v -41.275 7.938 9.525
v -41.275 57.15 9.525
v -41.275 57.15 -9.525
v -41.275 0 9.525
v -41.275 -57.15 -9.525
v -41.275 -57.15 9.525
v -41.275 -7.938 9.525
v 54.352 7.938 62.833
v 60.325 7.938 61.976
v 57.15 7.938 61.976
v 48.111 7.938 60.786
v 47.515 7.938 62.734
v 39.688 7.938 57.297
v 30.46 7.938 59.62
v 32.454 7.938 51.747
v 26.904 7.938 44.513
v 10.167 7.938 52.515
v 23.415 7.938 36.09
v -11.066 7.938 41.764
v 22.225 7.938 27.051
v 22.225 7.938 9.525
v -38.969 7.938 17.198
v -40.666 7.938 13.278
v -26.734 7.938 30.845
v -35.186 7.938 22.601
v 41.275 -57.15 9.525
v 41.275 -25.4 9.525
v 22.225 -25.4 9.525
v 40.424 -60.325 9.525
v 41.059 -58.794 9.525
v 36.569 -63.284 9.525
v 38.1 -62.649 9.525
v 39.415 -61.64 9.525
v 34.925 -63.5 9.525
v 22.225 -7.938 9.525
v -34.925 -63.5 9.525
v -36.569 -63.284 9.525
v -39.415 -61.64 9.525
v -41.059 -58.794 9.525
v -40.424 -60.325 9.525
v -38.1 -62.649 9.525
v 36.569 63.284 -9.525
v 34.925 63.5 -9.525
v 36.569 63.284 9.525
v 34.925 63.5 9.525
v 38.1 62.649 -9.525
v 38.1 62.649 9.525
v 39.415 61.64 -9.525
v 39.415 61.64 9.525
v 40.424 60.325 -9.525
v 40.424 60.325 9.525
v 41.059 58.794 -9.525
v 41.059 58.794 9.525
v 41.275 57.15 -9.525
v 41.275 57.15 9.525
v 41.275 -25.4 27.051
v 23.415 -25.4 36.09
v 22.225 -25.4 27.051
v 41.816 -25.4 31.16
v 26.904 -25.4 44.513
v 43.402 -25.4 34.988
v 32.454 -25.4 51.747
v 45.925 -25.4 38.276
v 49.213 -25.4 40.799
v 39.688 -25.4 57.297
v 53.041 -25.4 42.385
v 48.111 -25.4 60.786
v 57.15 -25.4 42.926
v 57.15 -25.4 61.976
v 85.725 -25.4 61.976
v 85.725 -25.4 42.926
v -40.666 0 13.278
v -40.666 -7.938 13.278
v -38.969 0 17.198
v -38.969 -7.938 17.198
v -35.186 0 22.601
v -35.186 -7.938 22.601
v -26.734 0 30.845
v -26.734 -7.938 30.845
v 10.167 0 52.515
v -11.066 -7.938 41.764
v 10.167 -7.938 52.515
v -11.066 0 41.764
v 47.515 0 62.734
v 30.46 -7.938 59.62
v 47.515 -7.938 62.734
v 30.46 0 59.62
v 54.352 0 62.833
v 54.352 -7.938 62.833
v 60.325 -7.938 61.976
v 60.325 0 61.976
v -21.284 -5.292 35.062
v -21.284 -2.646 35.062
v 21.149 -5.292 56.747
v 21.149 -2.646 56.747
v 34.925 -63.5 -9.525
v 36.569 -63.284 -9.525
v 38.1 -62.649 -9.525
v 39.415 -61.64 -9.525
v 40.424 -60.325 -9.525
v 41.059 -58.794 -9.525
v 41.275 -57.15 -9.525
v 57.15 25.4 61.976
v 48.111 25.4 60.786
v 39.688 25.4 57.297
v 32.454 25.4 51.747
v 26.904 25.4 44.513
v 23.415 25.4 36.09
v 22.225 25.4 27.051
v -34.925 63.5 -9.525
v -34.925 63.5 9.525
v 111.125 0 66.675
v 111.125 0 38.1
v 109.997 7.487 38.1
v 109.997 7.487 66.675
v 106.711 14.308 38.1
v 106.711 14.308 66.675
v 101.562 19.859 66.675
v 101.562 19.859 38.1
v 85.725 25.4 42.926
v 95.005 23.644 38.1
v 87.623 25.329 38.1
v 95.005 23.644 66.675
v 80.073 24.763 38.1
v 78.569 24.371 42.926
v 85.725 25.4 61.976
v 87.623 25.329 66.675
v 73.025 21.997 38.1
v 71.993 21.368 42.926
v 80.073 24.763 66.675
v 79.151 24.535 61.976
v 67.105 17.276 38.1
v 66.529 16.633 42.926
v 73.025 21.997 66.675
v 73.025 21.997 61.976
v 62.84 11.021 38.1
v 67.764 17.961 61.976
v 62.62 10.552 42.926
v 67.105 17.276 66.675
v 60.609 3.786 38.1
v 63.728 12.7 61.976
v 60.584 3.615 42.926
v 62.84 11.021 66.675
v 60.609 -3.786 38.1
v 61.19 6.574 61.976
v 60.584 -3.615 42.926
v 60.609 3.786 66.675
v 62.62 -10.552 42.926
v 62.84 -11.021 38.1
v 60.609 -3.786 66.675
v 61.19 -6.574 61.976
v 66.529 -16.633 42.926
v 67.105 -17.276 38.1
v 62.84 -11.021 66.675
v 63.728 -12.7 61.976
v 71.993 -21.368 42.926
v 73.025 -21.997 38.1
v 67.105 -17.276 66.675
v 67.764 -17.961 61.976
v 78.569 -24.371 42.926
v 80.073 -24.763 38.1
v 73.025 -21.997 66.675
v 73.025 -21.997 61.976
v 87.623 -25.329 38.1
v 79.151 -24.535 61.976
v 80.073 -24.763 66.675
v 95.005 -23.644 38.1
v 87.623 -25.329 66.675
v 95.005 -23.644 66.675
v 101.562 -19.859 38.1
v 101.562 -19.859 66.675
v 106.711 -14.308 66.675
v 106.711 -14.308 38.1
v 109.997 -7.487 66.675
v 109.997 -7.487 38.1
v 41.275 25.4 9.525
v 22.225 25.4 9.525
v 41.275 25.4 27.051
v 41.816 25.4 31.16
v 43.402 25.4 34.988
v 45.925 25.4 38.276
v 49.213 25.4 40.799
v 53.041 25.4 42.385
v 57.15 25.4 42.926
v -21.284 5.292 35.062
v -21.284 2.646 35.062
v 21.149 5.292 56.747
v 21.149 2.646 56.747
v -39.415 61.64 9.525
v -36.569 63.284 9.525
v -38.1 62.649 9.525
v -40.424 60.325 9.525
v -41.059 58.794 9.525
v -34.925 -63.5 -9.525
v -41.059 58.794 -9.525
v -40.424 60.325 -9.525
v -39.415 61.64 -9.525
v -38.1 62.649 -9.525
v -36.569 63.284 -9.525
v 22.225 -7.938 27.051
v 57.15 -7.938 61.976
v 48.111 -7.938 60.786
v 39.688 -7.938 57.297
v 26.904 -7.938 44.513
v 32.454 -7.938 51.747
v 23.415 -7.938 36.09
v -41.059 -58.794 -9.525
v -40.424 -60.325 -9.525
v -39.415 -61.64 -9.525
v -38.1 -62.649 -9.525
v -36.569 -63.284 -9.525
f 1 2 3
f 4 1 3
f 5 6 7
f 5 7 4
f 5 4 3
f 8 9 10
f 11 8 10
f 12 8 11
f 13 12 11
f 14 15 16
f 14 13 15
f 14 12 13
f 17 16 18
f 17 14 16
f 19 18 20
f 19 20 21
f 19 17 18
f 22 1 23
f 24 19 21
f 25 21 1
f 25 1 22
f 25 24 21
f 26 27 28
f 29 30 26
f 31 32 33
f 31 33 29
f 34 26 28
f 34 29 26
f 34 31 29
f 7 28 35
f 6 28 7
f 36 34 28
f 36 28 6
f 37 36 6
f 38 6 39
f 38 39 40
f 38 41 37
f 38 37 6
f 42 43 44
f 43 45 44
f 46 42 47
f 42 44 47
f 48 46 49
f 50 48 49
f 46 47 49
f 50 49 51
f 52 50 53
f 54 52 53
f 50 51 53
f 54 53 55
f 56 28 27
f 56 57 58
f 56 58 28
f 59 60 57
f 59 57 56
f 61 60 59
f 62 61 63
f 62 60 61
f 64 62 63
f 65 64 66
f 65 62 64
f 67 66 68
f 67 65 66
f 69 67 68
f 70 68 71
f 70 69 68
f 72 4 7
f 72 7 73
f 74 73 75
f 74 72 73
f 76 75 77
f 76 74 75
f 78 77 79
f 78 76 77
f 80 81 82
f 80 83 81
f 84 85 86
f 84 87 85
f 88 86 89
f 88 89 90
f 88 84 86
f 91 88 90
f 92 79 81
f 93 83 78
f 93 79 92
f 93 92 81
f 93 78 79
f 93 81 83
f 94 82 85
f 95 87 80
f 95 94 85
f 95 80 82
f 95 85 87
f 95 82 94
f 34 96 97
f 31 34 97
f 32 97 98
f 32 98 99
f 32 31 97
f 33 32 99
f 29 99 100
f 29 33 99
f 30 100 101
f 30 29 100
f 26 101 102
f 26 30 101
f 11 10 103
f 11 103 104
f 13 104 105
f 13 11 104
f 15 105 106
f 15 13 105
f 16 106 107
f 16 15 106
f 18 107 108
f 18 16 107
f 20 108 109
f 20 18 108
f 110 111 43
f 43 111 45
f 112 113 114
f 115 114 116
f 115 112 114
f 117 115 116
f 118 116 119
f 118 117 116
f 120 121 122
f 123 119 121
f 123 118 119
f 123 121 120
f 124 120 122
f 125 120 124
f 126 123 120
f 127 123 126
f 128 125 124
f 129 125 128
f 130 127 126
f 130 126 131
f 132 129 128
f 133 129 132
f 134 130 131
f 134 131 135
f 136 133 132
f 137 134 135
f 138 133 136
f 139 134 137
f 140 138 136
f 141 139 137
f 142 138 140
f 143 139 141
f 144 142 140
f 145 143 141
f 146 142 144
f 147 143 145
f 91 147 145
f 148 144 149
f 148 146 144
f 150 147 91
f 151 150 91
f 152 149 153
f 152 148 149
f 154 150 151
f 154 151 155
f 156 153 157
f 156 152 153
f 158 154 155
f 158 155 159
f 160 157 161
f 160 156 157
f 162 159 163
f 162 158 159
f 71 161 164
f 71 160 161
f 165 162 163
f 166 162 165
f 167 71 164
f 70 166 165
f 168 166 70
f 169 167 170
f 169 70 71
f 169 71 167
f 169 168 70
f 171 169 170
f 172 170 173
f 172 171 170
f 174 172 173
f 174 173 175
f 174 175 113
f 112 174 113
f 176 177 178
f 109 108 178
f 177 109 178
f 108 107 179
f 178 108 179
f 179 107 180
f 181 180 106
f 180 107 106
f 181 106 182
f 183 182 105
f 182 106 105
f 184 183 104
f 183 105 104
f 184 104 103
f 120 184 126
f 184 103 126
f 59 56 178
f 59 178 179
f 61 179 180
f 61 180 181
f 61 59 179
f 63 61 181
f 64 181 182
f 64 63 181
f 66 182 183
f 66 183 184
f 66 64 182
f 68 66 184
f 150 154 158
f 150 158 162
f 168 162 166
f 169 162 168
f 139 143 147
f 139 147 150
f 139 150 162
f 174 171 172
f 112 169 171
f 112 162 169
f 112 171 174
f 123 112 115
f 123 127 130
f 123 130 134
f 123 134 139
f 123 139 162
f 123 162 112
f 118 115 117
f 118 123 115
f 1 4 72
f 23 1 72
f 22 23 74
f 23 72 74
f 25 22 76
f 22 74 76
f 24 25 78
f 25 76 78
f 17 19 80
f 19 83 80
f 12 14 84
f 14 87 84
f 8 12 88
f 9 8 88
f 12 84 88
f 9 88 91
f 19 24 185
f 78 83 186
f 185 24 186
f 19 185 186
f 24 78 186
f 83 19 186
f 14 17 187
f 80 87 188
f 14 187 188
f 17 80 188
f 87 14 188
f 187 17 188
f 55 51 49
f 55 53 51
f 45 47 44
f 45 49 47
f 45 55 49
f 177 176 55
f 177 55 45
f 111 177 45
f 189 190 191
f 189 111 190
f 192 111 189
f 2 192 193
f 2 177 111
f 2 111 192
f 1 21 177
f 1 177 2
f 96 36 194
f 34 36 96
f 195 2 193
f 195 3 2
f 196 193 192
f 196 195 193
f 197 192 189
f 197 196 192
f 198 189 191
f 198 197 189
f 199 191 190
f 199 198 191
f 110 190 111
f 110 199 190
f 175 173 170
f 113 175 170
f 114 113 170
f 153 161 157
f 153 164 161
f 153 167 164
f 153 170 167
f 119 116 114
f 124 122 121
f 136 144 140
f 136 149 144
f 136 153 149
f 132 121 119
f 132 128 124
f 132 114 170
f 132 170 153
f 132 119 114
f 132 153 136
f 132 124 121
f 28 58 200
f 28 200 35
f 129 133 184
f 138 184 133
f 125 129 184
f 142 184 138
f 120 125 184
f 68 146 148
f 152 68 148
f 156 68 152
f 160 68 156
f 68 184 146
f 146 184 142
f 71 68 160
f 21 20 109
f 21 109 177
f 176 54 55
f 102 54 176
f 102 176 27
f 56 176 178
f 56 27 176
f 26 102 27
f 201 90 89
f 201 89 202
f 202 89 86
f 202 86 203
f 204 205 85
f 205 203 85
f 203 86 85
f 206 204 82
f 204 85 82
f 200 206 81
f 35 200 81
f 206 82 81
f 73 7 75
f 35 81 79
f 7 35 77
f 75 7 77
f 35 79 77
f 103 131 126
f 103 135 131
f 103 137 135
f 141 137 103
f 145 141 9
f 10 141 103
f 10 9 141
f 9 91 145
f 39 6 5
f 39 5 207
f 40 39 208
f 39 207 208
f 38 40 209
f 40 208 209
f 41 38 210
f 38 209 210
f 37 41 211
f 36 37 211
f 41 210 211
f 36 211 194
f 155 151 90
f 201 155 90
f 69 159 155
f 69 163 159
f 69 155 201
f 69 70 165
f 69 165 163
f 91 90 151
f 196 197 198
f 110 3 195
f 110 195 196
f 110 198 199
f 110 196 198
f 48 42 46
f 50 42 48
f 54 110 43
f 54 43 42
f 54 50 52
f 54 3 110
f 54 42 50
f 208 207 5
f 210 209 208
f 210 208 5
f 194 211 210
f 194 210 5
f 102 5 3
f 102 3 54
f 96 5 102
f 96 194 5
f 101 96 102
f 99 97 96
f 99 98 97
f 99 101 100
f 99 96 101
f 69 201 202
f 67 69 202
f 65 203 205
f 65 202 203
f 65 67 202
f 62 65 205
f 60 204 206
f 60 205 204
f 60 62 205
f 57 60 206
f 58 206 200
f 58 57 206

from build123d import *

# Parameters (mm, degrees)
F1_DEPTH = 63.5
F0_W     = 25.4
F0_H     = 19.05
F2_DEPTH = 25.4
F3_DEPTH = 7.9375
F4_R     = 6.35


with BuildPart() as f1:
    # F0 (on Front) → F1 (new body, symmetric)
    with BuildSketch(Plane.XZ):
        Polygon((-41.275, 9.525), (-41.275, -9.525), (41.275, -9.525), (41.275, 9.525), (22.225, 9.525), align=None)
    extrude(amount=F1_DEPTH, both=True)

    # F0 (on Front) → F2 (join, symmetric)
    with BuildSketch(Plane.XZ):
        with BuildLine():
            Line((22.225, 9.525), (41.275, 9.525))
            Line((41.275, 9.525), (41.275, 27.051))
            ThreePointArc((41.275, 27.051), (45.92468, 38.27632), (57.15, 42.926))
            Line((57.15, 42.926), (60.325, 42.926))
            Line((60.325, 42.926), (60.325, 61.976))
            Line((60.325, 61.976), (57.15, 61.976))
            ThreePointArc((57.15, 61.976), (32.454296, 51.746704), (22.225, 27.051))
            Line((22.225, 27.051), (22.225, 9.525))
        make_face()
        with Locations((73.025, 52.451)):
            Rectangle(F0_W, F0_H)
    extrude(amount=F2_DEPTH, both=True)

    # F0 (on Front) → F3 (join, symmetric)
    with BuildSketch(Plane.XZ):
        with BuildLine():
            add(Edge.make_bspline(
                [(-41.275, 9.525), (-41.072655, 32.786246), (31.344924, 69.177315), (60.325, 61.976)],
                knots=[0, 0, 0, 0, 114.340139, 114.340139, 114.340139, 114.340139], degree=3))
            Line((-41.275, 9.525), (22.225, 9.525))
            Line((22.225, 9.525), (22.225, 27.051))
            ThreePointArc((22.225, 27.051), (32.454296, 51.746704), (57.15, 61.976))
            Line((57.15, 61.976), (60.325, 61.976))
        make_face()
    extrude(amount=F3_DEPTH, both=True)

    # F4
    f4_edges = [f1.edges().sort_by_distance(p)[0] for p in [
        (41.275, -63.5, 0),
        (41.275, 63.5, 0),
        (-41.275, 63.5, 0),
        (-41.275, -63.5, 0),
    ]]
    fillet(f4_edges, radius=F4_R)

    # F0 (on Front) → F5 (revolve)
    with BuildSketch(Plane.XZ):
        Polygon((85.725, 66.675), (85.725, 61.976), (85.725, 42.926), (85.725, 38.1), (111.125, 38.1), (111.125, 66.675), align=None)
    revolve(axis=Axis((85.725, 0, 52.3875), (0, 0, 1)))


solid = f1.part
